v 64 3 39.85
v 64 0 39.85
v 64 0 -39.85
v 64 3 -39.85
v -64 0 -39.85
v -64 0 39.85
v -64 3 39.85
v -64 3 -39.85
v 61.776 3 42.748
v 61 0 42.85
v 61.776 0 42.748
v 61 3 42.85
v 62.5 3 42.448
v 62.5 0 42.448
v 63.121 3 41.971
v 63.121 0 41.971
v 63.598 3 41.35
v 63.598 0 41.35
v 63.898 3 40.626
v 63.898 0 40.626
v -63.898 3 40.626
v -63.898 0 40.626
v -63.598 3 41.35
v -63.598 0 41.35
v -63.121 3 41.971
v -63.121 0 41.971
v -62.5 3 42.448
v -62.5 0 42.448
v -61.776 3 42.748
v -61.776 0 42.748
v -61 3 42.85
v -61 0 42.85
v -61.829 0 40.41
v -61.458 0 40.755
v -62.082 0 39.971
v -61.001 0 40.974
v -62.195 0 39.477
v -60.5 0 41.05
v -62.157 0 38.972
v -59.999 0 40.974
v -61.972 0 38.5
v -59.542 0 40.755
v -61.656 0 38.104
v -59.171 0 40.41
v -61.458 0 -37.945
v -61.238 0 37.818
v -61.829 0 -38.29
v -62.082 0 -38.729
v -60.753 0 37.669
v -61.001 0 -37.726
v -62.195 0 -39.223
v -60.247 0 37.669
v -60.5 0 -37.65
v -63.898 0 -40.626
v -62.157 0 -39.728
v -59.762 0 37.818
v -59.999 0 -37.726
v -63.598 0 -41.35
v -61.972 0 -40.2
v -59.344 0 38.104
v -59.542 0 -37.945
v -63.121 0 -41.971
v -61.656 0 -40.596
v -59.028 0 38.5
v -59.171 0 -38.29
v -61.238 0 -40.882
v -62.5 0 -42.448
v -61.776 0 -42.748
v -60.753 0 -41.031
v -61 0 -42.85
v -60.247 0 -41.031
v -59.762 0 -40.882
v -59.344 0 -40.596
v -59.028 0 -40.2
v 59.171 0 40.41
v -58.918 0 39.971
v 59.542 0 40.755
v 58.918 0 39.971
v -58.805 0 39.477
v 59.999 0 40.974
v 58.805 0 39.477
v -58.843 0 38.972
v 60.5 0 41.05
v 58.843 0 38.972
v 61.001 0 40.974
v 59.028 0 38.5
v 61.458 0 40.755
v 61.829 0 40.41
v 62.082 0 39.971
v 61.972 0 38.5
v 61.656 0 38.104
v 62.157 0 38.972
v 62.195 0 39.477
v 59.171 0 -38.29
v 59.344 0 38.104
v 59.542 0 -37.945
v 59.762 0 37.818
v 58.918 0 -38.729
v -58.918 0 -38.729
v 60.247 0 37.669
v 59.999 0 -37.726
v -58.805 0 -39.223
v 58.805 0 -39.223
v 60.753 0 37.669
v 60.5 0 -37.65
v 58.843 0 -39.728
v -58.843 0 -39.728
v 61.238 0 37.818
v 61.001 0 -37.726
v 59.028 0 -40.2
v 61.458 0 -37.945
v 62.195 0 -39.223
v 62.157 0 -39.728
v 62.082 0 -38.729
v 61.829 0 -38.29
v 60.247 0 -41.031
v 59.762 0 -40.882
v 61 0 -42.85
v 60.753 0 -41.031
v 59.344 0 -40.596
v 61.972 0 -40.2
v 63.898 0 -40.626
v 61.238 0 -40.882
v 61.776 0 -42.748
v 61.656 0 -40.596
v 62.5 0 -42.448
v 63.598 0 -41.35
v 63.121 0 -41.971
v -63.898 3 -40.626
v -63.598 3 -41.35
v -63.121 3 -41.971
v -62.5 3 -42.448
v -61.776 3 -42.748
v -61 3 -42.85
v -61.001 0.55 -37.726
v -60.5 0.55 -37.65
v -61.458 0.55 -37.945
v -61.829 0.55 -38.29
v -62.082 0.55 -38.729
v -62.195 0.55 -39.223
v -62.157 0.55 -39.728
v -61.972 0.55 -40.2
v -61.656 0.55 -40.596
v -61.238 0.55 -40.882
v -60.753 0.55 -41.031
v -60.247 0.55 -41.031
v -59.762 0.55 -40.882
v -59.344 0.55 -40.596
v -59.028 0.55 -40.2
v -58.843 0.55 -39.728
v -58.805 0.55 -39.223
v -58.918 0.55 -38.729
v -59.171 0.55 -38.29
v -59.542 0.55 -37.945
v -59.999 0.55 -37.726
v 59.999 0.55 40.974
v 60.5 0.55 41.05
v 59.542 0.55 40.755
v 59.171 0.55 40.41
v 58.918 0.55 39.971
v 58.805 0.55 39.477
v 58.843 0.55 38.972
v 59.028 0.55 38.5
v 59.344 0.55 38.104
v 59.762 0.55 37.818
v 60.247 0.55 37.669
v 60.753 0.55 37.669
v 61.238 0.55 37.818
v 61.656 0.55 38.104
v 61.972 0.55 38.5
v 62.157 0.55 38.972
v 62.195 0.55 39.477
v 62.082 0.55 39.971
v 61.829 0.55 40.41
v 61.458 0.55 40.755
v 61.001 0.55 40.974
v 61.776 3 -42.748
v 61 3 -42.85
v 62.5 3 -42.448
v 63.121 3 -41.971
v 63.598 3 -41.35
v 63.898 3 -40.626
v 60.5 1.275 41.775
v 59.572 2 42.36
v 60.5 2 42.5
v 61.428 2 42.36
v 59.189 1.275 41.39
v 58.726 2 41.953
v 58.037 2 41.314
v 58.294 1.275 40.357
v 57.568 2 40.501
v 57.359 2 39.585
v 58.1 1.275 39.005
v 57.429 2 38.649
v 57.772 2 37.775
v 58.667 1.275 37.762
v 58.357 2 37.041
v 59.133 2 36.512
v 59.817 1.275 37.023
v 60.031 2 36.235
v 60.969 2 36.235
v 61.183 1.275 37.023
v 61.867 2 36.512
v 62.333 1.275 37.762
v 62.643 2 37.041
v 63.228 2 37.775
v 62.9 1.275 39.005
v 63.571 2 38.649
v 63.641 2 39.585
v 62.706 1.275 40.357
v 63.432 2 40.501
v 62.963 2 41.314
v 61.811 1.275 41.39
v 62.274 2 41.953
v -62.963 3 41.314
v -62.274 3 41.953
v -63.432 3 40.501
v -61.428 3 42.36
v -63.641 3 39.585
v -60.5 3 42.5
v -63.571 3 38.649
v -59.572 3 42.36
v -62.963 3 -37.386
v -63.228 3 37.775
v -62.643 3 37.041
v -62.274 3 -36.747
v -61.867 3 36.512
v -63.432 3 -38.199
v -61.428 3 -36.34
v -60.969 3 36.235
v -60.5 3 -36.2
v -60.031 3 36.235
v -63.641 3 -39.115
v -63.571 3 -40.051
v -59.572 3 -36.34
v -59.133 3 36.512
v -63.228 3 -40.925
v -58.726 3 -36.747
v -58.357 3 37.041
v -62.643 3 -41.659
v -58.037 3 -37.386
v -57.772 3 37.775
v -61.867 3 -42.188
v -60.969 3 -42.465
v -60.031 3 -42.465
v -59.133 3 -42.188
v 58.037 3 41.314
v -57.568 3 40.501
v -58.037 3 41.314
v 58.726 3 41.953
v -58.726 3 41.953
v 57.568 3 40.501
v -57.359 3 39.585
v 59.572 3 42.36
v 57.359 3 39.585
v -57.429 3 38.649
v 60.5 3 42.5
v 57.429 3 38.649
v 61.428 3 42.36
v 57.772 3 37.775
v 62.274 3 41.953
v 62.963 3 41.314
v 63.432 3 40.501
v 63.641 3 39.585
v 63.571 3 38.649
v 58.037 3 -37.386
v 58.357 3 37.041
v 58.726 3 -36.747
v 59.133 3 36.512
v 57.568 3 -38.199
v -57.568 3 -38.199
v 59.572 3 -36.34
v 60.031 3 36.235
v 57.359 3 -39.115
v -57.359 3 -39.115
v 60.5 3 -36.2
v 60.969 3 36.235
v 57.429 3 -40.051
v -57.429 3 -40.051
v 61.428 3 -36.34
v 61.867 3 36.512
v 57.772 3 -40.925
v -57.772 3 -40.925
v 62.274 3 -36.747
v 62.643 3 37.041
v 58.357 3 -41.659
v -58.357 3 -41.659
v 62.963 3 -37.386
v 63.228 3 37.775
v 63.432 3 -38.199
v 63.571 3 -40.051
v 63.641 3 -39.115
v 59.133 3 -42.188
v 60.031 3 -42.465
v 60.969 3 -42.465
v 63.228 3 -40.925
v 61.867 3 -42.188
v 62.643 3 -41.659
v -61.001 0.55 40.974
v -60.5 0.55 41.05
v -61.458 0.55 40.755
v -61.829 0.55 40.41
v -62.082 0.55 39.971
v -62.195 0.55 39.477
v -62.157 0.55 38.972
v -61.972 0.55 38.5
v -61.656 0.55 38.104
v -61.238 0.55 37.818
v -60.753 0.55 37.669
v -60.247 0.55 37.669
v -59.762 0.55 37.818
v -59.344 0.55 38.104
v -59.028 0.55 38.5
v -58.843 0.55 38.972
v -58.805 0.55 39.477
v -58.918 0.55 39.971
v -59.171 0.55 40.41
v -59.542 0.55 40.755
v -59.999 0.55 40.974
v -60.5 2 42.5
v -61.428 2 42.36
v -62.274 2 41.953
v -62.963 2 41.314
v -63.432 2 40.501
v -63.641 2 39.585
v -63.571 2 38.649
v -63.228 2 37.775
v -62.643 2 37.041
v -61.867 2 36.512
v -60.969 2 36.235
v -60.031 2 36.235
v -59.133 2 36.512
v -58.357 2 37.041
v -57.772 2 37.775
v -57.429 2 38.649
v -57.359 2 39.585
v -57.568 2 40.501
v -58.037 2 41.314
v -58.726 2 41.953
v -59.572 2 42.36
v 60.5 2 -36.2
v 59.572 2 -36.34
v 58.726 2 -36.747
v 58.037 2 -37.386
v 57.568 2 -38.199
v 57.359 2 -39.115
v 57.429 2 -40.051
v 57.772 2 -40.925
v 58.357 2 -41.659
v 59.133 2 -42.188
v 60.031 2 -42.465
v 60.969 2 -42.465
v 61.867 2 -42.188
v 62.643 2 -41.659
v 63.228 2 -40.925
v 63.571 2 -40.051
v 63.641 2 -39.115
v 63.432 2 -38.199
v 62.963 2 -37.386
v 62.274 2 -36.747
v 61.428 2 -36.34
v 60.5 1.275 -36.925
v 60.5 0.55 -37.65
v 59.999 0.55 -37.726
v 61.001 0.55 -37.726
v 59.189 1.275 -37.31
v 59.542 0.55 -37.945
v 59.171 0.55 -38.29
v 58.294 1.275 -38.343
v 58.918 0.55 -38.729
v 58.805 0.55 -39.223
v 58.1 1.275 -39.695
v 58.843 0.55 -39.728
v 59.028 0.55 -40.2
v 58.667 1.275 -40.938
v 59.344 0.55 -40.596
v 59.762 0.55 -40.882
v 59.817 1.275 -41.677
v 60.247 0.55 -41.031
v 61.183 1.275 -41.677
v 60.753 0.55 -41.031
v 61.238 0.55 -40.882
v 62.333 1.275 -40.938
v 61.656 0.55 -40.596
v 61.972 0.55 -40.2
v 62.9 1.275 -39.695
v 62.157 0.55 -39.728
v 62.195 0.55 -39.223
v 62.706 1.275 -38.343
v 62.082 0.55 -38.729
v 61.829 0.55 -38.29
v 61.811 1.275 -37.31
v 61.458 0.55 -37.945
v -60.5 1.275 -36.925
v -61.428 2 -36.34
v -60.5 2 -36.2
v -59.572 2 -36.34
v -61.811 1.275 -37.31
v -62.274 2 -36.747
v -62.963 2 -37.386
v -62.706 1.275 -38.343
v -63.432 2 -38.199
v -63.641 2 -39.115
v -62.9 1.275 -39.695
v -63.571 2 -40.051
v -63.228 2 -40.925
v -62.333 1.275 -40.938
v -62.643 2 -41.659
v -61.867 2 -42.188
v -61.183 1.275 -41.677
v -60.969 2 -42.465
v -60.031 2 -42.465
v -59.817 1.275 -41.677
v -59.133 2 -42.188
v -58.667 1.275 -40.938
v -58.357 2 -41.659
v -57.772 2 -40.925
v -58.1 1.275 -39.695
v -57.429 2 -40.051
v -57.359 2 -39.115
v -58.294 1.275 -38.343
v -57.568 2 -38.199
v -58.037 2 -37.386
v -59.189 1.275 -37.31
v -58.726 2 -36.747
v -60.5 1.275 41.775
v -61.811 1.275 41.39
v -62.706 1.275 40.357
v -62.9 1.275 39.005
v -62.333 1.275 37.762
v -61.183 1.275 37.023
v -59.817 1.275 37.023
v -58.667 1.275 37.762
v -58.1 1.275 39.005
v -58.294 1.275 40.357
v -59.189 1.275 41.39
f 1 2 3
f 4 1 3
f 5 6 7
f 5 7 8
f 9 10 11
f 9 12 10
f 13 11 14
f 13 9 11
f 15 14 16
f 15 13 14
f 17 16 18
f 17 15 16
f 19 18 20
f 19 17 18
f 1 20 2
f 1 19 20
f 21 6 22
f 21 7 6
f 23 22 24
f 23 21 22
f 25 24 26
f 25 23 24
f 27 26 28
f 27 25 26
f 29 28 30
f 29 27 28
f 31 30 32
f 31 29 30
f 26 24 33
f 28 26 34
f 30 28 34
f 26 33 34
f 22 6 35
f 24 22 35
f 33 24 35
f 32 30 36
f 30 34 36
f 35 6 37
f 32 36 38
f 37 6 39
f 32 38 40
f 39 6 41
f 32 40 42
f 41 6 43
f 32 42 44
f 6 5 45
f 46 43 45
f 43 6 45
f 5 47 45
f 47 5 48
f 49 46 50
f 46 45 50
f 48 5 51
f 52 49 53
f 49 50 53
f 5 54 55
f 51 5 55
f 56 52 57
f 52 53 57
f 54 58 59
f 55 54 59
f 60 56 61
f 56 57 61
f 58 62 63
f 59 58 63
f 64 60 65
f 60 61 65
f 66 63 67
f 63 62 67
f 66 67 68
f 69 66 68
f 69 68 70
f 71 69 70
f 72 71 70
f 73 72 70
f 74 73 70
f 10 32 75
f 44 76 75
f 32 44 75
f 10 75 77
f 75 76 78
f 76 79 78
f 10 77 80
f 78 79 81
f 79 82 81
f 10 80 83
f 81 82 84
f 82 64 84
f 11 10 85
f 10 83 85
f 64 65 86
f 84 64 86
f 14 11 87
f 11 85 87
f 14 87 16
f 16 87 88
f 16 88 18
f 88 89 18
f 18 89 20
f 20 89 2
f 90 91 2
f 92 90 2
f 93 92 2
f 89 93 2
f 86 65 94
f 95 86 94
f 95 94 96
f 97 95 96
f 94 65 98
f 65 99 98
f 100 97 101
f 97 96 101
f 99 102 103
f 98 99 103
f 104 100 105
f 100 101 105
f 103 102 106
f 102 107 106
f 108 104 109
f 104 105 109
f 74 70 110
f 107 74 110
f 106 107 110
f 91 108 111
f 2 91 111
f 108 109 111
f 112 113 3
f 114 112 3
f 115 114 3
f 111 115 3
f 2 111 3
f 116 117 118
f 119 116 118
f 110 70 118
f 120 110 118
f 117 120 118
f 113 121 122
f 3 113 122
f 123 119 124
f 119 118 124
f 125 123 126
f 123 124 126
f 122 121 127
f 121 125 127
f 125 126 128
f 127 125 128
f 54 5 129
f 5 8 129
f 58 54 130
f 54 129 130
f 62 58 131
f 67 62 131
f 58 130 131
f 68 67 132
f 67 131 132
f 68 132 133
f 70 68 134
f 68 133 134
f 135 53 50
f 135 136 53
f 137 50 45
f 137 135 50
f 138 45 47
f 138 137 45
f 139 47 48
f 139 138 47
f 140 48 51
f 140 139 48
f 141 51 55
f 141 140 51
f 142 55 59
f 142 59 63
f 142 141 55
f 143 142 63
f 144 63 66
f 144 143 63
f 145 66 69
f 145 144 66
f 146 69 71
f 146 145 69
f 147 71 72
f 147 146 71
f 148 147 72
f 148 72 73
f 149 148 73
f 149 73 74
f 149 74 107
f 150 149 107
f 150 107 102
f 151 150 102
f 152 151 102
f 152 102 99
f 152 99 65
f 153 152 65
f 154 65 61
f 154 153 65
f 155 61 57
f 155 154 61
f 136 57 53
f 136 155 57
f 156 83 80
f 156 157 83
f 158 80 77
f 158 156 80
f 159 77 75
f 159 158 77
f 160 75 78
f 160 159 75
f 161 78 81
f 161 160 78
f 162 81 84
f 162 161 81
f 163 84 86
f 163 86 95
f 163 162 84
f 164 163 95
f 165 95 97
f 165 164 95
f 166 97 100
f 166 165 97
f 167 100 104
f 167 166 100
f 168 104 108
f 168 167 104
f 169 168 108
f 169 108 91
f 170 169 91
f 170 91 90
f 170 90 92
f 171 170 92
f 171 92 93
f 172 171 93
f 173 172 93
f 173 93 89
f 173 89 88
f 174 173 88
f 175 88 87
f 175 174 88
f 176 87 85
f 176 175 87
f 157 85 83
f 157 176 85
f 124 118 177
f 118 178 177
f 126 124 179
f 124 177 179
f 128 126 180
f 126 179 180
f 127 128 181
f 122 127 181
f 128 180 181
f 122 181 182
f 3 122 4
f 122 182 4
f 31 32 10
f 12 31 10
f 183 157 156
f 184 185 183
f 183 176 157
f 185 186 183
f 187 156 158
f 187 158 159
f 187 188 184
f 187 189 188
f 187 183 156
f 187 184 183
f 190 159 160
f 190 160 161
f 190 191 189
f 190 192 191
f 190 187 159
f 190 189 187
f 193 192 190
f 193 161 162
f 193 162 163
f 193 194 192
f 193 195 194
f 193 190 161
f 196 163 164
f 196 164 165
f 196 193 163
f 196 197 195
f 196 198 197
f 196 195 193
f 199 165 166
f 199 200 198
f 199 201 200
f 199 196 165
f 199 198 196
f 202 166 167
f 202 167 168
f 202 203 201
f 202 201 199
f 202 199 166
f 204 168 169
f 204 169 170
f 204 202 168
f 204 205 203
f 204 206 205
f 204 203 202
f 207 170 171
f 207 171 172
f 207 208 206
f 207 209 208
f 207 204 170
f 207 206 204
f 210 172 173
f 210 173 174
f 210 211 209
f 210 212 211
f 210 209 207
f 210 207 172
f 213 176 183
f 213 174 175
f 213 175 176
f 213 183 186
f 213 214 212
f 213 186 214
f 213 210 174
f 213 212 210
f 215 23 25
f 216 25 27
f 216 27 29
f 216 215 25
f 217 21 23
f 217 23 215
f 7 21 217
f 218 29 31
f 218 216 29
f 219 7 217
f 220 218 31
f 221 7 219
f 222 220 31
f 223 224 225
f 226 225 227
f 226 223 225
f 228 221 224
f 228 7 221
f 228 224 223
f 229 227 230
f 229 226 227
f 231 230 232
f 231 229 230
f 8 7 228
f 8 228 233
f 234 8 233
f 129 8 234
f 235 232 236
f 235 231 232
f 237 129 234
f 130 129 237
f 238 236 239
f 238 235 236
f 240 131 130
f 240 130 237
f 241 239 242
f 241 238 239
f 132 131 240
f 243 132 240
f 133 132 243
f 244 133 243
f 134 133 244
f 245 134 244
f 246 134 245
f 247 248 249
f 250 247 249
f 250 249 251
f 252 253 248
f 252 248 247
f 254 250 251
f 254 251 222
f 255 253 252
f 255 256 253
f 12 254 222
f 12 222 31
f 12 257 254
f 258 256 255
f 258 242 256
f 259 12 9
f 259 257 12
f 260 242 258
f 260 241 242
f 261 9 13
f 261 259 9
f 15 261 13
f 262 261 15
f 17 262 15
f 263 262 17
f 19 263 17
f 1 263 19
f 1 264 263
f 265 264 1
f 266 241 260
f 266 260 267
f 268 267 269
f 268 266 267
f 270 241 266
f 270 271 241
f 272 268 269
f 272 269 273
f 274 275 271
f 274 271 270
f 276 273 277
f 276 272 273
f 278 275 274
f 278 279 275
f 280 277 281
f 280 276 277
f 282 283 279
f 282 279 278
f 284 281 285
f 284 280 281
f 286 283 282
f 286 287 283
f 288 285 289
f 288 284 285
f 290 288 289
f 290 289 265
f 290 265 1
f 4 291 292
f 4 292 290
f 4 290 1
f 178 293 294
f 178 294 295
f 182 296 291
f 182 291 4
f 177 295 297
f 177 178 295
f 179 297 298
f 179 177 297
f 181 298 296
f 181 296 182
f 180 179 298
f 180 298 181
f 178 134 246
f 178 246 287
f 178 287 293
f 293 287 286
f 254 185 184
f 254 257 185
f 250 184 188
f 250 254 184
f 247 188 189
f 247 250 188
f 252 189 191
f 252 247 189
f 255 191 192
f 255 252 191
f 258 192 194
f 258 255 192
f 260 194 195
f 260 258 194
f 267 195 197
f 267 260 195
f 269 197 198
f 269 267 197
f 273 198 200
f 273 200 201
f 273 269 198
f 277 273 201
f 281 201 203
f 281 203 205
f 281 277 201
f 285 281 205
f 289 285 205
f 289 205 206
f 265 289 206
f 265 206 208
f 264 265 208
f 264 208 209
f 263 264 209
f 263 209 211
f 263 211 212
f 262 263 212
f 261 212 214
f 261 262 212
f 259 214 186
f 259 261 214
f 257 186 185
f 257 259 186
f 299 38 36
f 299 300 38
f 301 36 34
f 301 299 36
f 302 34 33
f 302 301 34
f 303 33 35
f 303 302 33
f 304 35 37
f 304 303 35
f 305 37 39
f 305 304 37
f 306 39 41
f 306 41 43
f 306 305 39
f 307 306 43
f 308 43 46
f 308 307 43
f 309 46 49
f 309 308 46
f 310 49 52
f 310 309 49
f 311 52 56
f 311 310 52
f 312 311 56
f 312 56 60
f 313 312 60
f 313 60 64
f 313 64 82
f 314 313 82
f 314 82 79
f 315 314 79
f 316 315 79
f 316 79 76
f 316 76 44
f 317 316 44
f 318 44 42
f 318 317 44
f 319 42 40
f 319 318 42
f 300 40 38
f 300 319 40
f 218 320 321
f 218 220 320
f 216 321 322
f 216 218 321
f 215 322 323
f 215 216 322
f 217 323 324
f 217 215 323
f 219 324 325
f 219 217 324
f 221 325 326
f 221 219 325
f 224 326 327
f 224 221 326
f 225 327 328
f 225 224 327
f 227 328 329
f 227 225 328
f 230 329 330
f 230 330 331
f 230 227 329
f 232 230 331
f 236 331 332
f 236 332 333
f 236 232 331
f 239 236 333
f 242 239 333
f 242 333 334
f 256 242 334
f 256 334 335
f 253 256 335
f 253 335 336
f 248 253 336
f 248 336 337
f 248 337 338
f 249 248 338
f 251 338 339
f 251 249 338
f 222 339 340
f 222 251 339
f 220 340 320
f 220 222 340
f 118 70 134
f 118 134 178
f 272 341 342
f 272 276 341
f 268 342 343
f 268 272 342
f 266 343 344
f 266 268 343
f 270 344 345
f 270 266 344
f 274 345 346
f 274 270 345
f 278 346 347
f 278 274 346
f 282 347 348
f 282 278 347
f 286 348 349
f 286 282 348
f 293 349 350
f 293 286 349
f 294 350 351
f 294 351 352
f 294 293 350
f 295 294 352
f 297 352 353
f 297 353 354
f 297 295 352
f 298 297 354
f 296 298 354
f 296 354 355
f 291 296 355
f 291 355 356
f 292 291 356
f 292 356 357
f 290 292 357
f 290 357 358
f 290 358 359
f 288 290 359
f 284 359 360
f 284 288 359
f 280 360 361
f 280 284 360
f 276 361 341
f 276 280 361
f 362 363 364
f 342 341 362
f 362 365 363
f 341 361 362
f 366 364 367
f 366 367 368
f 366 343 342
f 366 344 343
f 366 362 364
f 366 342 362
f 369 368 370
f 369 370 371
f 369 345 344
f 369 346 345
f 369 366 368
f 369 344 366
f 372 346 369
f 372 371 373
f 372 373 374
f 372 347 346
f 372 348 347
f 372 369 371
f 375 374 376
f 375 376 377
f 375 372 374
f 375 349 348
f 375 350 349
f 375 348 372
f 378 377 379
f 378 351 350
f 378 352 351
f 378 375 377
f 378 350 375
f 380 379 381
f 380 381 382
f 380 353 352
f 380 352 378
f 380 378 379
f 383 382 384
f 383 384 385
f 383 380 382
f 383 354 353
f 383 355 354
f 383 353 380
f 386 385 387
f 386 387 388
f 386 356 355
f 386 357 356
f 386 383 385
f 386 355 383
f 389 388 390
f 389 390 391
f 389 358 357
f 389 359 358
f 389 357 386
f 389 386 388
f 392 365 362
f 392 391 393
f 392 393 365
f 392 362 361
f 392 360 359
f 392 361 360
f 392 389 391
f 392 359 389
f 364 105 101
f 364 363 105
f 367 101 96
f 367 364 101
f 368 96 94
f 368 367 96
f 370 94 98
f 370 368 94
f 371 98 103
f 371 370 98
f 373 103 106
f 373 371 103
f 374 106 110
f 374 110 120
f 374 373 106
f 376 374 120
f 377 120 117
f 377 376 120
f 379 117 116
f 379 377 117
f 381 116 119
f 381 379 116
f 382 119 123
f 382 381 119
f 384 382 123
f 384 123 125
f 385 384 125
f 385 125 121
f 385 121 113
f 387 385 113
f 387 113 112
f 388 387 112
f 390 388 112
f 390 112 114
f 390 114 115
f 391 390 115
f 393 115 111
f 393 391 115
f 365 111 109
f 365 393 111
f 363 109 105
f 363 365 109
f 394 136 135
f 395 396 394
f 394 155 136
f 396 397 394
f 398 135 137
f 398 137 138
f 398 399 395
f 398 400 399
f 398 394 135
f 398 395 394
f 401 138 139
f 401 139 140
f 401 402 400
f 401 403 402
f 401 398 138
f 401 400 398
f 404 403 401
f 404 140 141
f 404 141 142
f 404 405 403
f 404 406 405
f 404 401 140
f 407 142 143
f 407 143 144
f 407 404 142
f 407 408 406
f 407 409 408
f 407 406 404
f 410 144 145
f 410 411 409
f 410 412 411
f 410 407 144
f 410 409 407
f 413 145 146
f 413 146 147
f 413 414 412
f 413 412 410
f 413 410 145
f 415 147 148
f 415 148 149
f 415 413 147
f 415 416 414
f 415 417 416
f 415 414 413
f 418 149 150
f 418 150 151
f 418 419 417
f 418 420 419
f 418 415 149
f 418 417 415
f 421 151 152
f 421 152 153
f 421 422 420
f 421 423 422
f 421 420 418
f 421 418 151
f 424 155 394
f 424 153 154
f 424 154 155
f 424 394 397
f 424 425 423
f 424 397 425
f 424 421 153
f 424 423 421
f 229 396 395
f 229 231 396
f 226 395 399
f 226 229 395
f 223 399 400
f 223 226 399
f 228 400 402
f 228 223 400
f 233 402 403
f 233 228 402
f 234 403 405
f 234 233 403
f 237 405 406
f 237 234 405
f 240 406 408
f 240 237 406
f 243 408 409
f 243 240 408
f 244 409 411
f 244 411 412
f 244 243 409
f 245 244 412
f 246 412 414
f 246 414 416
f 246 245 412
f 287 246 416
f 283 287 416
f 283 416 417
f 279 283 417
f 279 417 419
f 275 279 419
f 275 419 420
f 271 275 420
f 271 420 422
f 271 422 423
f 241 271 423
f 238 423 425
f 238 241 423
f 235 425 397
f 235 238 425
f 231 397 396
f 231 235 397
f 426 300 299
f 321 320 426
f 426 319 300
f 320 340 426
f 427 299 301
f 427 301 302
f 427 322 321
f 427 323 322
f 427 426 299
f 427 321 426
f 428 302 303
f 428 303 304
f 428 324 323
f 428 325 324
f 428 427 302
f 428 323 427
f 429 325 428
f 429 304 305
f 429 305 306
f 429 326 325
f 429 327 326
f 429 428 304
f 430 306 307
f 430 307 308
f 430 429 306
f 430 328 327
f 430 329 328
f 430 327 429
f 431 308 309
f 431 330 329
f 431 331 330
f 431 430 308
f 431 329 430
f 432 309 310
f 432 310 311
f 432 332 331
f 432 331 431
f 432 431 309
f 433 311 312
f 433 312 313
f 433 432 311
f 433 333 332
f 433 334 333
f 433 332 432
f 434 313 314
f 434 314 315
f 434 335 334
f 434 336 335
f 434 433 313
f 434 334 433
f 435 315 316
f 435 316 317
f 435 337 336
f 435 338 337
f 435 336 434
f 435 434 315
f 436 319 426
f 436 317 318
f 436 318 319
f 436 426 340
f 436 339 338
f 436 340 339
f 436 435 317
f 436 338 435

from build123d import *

# Parameters (mm, degrees)
SKETCH1_W                                      = 128
SKETCH1_H                                      = 85.7
BOSS_EXTRUDE1_DEPTH                            = 3
CSK_FOR_M3_FLAT_HEAD_MACHINE_SCREW1_AT_2_COUNT = 2
CSK_FOR_M3_FLAT_HEAD_MACHINE_SCREW1_AT_2_PITCH = 121
CSK_FOR_M3_FLAT_HEAD_MACHINE_SCREW1_AT_3_COUNT = 2
CSK_FOR_M3_FLAT_HEAD_MACHINE_SCREW1_AT_3_PITCH = 144.342266852
CSK_FOR_M3_FLAT_HEAD_MACHINE_SCREW1_AT_4_COUNT = 2
CSK_FOR_M3_FLAT_HEAD_MACHINE_SCREW1_AT_4_PITCH = 78.7
FILLET1_R                                      = 3


with BuildPart() as part:
    # Sketch1 → Boss-Extrude1 (new body)
    with BuildSketch(Plane(origin=(0, 0, 0), x_dir=(1, 0, 0), z_dir=(0, 1, 0))):
        Rectangle(SKETCH1_W, SKETCH1_H)
    extrude(amount=BOSS_EXTRUDE1_DEPTH)

    # Sketch3 → CSK for M3 Flat Head Machine Screw1 (revolve, cut)
    with BuildSketch(Plane(origin=(-60.5, 3, -39.35), x_dir=(0, 0, 1), z_dir=(1, 0, 0))):
        Polygon((0, 0), (0, 4.021463052), (1.7, 3), (1.7, 2.45), (3.15, 1), (3.15, 0), align=None)
    csk_for_m3_flat_head_machine_screw1 = revolve(axis=Axis((-60.5, 9.35, -39.35), (0, -1, 0)), mode=Mode.SUBTRACT)

    # CSK for M3 Flat Head Machine Screw1 at 2: CSK for M3 Flat Head Machine Screw1 ×2
    with Locations(*[(i * CSK_FOR_M3_FLAT_HEAD_MACHINE_SCREW1_AT_2_PITCH, 0, 0) for i in range(1, CSK_FOR_M3_FLAT_HEAD_MACHINE_SCREW1_AT_2_COUNT)]):
        add(csk_for_m3_flat_head_machine_screw1, mode=Mode.SUBTRACT)

    # CSK for M3 Flat Head Machine Screw1 at 3: CSK for M3 Flat Head Machine Screw1 ×2
    with Locations(*[Vector(0.8382852967384159, 0, 0.54523184176292) * (i * CSK_FOR_M3_FLAT_HEAD_MACHINE_SCREW1_AT_3_PITCH) for i in range(1, CSK_FOR_M3_FLAT_HEAD_MACHINE_SCREW1_AT_3_COUNT)]):
        add(csk_for_m3_flat_head_machine_screw1, mode=Mode.SUBTRACT)

    # CSK for M3 Flat Head Machine Screw1 at 4: CSK for M3 Flat Head Machine Screw1 ×2
    with Locations(*[(0, 0, i * CSK_FOR_M3_FLAT_HEAD_MACHINE_SCREW1_AT_4_PITCH) for i in range(1, CSK_FOR_M3_FLAT_HEAD_MACHINE_SCREW1_AT_4_COUNT)]):
        add(csk_for_m3_flat_head_machine_screw1, mode=Mode.SUBTRACT)

    # Fillet1
    fillet1_edges = [part.edges().sort_by_distance(p)[0] for p in [
        (64, 1.5, 42.85),
        (-64, 1.5, 42.85),
        (-64, 1.5, -42.85),
        (64, 1.5, -42.85),
    ]]
    fillet(fillet1_edges, radius=FILLET1_R)


solid = part.part
